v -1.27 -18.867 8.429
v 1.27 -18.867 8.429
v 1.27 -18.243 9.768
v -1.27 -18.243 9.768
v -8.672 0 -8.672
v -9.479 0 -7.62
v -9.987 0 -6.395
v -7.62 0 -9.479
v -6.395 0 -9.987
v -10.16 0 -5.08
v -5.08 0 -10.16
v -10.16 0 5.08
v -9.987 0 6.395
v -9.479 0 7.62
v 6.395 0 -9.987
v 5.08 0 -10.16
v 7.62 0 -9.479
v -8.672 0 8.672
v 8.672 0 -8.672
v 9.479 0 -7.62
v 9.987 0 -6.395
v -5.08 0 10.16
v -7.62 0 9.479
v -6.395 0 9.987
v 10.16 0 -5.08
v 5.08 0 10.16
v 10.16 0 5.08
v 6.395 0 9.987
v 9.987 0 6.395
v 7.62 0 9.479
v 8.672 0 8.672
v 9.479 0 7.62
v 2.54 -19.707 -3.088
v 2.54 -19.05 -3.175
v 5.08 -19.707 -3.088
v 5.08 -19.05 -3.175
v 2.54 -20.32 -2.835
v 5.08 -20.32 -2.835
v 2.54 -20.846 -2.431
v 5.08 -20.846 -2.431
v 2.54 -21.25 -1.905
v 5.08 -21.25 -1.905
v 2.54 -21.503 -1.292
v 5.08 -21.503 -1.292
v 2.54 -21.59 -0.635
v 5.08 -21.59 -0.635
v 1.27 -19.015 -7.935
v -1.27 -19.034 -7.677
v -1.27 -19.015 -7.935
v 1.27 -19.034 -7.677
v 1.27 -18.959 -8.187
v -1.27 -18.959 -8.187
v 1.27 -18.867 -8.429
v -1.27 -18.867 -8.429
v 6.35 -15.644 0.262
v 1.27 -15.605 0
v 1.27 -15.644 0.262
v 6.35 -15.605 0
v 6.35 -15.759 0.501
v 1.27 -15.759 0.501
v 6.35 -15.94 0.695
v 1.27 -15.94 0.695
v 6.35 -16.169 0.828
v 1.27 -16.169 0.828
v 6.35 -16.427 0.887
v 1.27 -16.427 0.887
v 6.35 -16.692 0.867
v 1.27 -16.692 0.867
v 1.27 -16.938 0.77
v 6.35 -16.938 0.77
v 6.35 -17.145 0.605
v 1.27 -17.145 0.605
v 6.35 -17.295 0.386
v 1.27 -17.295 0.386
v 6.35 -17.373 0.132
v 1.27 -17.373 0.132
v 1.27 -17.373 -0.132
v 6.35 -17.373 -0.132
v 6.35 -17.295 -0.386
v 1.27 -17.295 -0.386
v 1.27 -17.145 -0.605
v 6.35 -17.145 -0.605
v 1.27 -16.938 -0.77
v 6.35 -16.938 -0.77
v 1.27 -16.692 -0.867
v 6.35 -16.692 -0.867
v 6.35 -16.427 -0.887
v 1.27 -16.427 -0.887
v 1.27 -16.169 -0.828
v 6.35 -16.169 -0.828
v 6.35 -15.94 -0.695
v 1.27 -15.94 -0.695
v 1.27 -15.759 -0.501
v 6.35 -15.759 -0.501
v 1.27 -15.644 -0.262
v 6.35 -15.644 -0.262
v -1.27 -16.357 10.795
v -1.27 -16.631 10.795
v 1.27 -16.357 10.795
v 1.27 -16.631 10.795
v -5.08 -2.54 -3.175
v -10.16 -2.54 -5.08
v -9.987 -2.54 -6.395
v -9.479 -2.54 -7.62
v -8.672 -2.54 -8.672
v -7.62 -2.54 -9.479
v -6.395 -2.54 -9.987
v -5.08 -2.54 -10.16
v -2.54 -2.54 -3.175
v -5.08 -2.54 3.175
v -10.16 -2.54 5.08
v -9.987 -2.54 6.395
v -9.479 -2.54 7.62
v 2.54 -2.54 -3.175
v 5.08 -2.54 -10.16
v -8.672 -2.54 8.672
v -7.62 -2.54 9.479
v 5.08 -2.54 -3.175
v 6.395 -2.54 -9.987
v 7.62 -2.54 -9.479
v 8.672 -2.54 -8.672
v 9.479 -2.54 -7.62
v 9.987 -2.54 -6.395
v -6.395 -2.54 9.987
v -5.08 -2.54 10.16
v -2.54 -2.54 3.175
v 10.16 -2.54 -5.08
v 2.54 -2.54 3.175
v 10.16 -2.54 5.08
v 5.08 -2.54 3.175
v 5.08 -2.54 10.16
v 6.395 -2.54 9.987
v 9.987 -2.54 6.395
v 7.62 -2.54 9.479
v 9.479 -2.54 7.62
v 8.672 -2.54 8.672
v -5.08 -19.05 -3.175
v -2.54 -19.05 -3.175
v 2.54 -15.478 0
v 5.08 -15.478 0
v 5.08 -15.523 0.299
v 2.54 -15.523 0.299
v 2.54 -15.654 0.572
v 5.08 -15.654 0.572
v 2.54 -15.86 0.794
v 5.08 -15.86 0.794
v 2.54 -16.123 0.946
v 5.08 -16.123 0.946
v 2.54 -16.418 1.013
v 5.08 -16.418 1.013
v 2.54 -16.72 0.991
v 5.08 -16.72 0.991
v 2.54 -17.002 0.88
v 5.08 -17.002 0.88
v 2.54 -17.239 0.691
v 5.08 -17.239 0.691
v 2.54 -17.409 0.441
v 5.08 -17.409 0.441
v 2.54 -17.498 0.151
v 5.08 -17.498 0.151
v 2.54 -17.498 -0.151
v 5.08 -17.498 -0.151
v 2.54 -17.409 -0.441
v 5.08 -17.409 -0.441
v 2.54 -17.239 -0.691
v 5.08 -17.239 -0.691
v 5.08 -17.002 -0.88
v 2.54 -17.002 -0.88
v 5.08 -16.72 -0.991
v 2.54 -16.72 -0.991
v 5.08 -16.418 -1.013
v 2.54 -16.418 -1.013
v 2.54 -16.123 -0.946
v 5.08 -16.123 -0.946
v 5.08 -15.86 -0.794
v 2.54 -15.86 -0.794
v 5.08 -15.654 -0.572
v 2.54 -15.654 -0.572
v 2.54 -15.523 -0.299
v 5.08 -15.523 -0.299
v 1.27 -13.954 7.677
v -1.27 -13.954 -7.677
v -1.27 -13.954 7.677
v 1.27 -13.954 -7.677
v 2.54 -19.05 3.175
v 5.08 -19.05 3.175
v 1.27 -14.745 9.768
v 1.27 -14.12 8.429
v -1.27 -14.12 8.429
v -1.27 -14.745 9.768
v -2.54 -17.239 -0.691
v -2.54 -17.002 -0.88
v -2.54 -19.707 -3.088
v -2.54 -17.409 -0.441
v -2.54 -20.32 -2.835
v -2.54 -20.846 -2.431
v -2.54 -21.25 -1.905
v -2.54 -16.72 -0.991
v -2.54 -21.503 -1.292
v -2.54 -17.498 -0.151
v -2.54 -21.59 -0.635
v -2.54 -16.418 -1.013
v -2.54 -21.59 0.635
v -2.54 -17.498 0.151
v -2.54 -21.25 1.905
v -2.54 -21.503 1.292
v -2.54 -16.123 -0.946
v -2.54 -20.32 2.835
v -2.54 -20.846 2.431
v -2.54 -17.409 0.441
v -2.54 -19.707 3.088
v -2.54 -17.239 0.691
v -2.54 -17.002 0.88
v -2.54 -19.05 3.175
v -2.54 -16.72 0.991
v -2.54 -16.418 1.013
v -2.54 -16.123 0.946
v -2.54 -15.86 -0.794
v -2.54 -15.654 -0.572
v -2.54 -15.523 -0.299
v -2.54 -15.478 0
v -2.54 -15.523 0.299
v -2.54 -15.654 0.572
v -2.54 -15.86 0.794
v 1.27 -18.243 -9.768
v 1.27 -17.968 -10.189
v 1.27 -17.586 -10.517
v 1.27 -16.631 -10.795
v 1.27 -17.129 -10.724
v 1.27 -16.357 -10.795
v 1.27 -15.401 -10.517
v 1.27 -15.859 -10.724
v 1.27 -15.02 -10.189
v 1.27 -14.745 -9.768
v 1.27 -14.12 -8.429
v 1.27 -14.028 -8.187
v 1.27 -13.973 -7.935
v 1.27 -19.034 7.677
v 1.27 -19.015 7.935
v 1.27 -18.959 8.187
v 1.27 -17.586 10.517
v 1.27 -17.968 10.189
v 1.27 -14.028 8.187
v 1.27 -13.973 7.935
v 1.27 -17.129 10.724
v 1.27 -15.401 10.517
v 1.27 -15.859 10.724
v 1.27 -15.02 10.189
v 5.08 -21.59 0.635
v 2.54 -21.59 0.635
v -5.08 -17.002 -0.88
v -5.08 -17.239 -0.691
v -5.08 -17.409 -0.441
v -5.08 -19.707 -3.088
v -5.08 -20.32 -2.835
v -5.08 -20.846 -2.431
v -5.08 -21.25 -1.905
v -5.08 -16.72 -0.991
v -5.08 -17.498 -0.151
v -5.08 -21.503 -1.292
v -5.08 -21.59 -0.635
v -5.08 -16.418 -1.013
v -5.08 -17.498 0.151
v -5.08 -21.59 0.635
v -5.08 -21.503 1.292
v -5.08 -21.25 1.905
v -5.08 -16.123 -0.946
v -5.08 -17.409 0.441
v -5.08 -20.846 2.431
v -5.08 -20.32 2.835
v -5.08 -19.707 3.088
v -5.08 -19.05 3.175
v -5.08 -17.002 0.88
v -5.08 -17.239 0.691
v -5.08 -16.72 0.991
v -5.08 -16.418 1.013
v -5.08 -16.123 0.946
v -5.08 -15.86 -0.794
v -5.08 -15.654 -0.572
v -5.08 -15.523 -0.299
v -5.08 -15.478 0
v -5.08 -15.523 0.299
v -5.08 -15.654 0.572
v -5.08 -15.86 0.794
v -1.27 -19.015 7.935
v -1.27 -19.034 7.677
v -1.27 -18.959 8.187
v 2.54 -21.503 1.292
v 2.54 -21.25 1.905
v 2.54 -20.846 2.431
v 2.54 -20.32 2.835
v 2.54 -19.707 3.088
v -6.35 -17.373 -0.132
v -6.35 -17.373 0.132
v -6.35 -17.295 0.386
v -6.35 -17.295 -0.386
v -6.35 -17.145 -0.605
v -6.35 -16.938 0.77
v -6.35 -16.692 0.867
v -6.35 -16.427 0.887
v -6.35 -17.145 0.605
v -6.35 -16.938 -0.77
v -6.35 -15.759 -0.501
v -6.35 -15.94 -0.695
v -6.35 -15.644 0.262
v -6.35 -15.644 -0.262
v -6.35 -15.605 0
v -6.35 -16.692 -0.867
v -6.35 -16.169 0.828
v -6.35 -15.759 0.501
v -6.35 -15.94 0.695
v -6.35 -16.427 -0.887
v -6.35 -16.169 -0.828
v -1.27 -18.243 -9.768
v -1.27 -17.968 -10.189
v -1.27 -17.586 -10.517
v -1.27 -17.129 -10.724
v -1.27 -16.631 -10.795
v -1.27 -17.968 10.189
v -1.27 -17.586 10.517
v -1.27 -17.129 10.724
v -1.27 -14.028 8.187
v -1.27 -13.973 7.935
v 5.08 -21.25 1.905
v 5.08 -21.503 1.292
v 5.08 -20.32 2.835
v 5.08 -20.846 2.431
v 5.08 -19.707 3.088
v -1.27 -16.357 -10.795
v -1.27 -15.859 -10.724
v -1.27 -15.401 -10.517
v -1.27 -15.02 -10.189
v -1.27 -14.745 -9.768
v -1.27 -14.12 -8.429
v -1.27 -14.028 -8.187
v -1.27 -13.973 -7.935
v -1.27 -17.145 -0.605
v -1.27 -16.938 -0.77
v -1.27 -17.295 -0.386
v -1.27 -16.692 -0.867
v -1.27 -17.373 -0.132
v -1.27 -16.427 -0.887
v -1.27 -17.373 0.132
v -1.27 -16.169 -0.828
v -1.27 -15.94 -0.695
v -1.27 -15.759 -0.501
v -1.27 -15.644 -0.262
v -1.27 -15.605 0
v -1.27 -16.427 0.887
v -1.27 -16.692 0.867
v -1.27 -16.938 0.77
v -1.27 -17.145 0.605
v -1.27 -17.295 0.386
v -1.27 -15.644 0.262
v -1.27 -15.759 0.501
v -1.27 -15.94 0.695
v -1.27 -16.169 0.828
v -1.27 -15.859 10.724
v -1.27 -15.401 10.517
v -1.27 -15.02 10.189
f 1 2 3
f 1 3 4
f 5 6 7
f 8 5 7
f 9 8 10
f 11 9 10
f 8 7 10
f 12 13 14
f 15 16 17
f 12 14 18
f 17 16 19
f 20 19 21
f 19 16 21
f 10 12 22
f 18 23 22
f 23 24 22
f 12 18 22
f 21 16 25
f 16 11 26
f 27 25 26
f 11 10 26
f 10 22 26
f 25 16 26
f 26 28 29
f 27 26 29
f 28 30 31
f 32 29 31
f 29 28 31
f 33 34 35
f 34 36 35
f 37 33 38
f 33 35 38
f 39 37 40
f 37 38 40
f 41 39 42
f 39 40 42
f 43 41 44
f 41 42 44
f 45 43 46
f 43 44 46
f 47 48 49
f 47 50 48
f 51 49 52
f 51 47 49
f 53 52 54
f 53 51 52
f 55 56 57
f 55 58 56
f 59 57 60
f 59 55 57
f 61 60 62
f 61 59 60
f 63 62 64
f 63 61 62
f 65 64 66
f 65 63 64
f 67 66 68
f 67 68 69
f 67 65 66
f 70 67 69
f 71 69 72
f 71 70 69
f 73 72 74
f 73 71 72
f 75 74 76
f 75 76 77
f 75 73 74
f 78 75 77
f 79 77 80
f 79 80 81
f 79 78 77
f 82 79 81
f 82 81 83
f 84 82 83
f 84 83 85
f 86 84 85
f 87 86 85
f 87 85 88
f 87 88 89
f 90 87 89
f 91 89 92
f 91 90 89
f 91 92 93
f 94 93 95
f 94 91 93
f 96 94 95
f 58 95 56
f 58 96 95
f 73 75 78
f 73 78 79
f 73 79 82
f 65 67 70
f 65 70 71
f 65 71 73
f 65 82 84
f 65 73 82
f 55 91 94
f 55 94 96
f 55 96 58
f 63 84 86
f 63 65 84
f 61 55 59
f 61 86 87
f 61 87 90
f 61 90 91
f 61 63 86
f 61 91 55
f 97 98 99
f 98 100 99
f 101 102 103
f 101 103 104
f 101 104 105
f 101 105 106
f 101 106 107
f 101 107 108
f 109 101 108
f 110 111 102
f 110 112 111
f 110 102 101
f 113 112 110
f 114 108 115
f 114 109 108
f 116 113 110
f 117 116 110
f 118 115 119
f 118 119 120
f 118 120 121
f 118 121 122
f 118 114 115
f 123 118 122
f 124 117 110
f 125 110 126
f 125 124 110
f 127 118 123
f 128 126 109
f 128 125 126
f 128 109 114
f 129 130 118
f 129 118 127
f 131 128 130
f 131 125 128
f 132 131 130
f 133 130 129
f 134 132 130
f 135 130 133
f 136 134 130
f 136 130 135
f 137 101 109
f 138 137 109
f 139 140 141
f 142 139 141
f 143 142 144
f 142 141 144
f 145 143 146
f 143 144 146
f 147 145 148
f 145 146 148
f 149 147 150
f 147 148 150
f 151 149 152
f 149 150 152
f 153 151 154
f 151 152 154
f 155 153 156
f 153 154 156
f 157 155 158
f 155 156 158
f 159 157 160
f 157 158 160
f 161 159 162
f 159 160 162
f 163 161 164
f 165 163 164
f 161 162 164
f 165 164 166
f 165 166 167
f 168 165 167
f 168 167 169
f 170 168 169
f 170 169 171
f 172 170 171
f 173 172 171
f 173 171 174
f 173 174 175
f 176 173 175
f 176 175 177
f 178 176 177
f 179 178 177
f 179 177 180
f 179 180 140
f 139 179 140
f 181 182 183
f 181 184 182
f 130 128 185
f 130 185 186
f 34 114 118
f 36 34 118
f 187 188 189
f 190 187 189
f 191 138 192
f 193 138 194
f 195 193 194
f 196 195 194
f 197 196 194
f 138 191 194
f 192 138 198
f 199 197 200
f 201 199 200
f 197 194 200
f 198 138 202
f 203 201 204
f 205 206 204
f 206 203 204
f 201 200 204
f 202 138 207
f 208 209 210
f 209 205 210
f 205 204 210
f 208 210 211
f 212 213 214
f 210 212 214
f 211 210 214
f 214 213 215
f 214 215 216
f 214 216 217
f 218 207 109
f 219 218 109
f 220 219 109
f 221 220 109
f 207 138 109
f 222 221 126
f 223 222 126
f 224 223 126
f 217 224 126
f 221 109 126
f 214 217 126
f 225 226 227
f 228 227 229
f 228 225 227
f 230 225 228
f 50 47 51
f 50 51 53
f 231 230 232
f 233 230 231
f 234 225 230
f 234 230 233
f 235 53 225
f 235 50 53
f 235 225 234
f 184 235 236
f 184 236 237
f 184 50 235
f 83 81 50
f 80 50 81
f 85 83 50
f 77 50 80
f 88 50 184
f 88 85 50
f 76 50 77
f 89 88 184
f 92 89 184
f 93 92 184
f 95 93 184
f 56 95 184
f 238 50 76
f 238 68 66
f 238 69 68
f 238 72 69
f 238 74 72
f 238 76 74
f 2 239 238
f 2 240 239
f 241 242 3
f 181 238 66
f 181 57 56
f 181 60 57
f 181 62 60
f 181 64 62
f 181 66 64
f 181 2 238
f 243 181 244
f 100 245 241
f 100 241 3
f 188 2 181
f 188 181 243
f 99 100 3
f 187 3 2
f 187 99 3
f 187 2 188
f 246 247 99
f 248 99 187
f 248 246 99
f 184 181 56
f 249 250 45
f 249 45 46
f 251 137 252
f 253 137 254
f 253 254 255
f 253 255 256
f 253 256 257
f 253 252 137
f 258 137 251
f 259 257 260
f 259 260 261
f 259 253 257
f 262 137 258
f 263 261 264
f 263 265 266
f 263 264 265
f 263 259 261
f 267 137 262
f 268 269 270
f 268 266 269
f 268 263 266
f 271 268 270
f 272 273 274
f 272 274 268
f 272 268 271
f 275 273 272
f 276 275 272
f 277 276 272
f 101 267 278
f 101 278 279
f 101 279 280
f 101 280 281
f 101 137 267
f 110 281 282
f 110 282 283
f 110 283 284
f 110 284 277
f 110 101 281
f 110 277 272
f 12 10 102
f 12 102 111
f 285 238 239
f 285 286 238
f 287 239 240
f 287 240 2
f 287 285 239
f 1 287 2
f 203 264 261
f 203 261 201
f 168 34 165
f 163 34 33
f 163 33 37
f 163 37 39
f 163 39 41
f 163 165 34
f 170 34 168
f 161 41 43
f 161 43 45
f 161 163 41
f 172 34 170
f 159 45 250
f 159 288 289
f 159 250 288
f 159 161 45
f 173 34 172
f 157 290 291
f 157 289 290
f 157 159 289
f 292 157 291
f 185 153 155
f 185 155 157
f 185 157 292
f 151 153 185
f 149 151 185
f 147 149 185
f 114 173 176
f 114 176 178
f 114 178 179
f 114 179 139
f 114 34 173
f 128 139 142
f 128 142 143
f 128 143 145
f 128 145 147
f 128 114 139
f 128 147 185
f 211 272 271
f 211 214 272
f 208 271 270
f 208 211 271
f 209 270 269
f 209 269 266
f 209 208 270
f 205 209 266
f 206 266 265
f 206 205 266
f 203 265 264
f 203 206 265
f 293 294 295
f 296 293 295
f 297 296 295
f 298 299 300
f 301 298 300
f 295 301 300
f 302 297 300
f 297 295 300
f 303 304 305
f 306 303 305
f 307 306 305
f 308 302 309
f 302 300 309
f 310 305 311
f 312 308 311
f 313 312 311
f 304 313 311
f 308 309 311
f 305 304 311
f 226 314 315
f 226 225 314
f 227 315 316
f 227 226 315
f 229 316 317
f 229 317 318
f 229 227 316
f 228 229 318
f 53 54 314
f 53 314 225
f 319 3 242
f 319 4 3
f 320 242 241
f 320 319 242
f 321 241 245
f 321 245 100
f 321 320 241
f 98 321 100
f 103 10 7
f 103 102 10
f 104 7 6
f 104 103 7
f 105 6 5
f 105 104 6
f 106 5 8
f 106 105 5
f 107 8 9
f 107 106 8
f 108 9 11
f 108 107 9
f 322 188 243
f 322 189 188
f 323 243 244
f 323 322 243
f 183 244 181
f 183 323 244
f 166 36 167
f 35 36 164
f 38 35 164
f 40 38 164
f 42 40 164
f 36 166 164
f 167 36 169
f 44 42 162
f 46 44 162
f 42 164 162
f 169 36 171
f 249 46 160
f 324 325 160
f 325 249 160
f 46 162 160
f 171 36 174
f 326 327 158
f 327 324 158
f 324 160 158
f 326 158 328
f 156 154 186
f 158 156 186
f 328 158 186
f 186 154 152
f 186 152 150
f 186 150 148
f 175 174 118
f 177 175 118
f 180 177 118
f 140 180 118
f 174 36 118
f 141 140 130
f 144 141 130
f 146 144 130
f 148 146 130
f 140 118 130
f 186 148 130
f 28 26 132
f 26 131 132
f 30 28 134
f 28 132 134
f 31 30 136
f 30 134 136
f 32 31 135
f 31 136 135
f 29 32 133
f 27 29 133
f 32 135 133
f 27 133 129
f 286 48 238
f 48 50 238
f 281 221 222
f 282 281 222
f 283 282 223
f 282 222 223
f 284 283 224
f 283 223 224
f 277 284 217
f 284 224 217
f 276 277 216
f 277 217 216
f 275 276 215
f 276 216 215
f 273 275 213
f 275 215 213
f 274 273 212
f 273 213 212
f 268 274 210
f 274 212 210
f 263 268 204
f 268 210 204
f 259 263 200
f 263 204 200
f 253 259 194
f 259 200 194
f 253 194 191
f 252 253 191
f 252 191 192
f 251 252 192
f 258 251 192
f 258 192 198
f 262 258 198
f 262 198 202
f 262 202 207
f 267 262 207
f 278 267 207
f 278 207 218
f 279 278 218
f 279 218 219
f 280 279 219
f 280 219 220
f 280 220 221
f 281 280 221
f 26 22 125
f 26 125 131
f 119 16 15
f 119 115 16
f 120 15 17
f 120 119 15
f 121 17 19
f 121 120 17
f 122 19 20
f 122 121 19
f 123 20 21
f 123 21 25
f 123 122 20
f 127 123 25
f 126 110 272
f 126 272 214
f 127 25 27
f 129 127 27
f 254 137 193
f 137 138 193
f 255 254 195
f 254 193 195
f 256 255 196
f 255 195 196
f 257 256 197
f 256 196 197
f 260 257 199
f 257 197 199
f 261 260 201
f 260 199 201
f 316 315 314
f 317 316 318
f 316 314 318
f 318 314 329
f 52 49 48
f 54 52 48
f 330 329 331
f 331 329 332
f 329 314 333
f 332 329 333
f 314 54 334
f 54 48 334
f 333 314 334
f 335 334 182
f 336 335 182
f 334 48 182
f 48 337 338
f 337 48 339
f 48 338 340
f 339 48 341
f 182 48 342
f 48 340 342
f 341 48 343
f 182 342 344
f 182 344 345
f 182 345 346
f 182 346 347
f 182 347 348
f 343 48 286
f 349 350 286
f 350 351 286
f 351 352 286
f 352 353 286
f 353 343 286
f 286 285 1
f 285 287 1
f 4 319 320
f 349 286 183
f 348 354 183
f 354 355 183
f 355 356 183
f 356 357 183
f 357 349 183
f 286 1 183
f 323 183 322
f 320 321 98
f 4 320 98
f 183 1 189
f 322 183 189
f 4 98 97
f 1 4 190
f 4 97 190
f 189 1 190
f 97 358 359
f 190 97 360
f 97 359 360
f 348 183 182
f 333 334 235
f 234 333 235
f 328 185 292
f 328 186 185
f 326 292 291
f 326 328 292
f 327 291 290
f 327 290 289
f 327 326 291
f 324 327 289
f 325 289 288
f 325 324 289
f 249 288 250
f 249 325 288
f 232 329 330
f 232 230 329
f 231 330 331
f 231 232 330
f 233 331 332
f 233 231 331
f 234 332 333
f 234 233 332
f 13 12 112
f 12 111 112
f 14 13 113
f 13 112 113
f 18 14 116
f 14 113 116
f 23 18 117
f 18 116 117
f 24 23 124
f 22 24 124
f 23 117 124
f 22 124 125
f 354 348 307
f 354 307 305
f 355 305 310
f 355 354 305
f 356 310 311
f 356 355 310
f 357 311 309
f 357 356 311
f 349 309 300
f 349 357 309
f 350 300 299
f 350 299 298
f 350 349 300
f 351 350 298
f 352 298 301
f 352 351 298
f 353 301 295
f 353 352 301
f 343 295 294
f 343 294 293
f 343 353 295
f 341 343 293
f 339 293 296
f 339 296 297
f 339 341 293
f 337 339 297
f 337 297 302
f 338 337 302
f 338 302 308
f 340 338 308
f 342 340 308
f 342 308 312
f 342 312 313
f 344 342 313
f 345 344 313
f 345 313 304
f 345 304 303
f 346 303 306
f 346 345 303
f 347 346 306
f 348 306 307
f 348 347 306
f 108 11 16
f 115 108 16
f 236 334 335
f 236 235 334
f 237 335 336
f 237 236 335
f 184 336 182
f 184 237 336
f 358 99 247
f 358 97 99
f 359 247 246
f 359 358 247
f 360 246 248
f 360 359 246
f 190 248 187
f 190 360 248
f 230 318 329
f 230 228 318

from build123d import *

# Parameters (mm, degrees)
F0_W        = 20.32
F0_H        = 20.32
F1_DEPTH    = 2.54
F2_W        = 2.54
F2_H        = 6.35
F3_DEPTH    = 19.05
F4_R        = 1.016
F5_DEPTH    = 20.321
F6_W        = 5.08
F6_H        = 21.59
F7_DEPTH    = 1.27
F8_R        = 0.889
F9_DEPTH    = 6.35
F10_R       = 2.54
F11_SIZE2   = 2.723523789
F11_SIZE    = 1.27
F11_2_SIZE2 = 2.723523789
F11_2_SIZE  = 1.27
F12_R       = 1.778
F13_R       = 5.08


with BuildPart() as f1:
    # F0 (on Front) → F1 (new body)
    with BuildSketch(Plane.XZ):
        Rectangle(F0_W, F0_H)
    extrude(amount=F1_DEPTH)

    # F2 (on face) → F3 (join)
    with BuildSketch(Plane.XZ.offset(2.54)):
        with Locations((-3.81, 0)):
            Rectangle(F2_W, F2_H)
        with Locations((3.81, 0)):
            Rectangle(F2_W, F2_H)
    extrude(amount=F3_DEPTH)

    # F4 (on face) → F5 (cut, through all)
    with BuildSketch(Plane.YZ.offset(10.16)):
        with Locations((-16.4937997073, 0)):
            Circle(F4_R)
    extrude(amount=-F5_DEPTH, mode=Mode.SUBTRACT)

    # F10
    f10_edges = [f1.edges().sort_by_distance(p)[0] for p in [
        (3.81, -21.59, 3.175),
        (-3.81, -21.59, 3.175),
        (-3.81, -21.59, -3.175),
        (3.81, -21.59, -3.175),
    ]]
    fillet(f10_edges, radius=F10_R)

    # F13
    f13_edges = [f1.edges().sort_by_distance(p)[0] for p in [
        (10.16, -1.27, 10.16),
        (-10.16, -1.27, 10.16),
        (10.16, -1.27, -10.16),
        (-10.16, -1.27, -10.16),
    ]]
    fillet(f13_edges, radius=F13_R)


with BuildPart() as f7:
    # F6 (on Right) → F7 (new body, symmetric)
    with BuildSketch(Plane.YZ):
        with Locations((-16.4937997073, 0)):
            Rectangle(F6_W, F6_H)
    extrude(amount=F7_DEPTH, both=True)

    # F8 (on Right) → F9 (join, symmetric)
    with BuildSketch(Plane.YZ):
        with Locations((-16.4937997073, 0)):
            Circle(F8_R)
    extrude(amount=F9_DEPTH, both=True)

    # F11
    f11_edges = [f7.edges().sort_by_distance(p)[0] for p in [
        (0, -13.9538, 10.795),
        (0, -19.0338, 10.795),
    ]]
    f11_side = f7.faces().sort_by_distance((0, -16.4938, 10.795))[0]
    chamfer(f11_edges, length=F11_SIZE, length2=F11_SIZE2, reference=f11_side)

    # F11#2
    f11_2_edges = [f7.edges().sort_by_distance(p)[0] for p in [
        (0, -19.0338, -10.795),
        (0, -13.9538, -10.795),
    ]]
    f11_2_side = f7.faces().sort_by_distance((0, -16.4938, -10.795))[0]
    chamfer(f11_2_edges, length=F11_2_SIZE, length2=F11_2_SIZE2, reference=f11_2_side)

    # F12
    f12_edges = [f7.edges().sort_by_distance(p)[0] for p in [
        (0, -13.9538, 8.071476),
        (0, -15.2238, 10.795),
        (0, -17.7638, 10.795),
        (0, -19.0338, 8.071476),
        (0, -13.9538, -8.071476),
        (0, -15.2238, -10.795),
        (0, -17.7638, -10.795),
        (0, -19.0338, -8.071476),
    ]]
    fillet(f12_edges, radius=F12_R)


solid = Compound([f1.part, f7.part])
